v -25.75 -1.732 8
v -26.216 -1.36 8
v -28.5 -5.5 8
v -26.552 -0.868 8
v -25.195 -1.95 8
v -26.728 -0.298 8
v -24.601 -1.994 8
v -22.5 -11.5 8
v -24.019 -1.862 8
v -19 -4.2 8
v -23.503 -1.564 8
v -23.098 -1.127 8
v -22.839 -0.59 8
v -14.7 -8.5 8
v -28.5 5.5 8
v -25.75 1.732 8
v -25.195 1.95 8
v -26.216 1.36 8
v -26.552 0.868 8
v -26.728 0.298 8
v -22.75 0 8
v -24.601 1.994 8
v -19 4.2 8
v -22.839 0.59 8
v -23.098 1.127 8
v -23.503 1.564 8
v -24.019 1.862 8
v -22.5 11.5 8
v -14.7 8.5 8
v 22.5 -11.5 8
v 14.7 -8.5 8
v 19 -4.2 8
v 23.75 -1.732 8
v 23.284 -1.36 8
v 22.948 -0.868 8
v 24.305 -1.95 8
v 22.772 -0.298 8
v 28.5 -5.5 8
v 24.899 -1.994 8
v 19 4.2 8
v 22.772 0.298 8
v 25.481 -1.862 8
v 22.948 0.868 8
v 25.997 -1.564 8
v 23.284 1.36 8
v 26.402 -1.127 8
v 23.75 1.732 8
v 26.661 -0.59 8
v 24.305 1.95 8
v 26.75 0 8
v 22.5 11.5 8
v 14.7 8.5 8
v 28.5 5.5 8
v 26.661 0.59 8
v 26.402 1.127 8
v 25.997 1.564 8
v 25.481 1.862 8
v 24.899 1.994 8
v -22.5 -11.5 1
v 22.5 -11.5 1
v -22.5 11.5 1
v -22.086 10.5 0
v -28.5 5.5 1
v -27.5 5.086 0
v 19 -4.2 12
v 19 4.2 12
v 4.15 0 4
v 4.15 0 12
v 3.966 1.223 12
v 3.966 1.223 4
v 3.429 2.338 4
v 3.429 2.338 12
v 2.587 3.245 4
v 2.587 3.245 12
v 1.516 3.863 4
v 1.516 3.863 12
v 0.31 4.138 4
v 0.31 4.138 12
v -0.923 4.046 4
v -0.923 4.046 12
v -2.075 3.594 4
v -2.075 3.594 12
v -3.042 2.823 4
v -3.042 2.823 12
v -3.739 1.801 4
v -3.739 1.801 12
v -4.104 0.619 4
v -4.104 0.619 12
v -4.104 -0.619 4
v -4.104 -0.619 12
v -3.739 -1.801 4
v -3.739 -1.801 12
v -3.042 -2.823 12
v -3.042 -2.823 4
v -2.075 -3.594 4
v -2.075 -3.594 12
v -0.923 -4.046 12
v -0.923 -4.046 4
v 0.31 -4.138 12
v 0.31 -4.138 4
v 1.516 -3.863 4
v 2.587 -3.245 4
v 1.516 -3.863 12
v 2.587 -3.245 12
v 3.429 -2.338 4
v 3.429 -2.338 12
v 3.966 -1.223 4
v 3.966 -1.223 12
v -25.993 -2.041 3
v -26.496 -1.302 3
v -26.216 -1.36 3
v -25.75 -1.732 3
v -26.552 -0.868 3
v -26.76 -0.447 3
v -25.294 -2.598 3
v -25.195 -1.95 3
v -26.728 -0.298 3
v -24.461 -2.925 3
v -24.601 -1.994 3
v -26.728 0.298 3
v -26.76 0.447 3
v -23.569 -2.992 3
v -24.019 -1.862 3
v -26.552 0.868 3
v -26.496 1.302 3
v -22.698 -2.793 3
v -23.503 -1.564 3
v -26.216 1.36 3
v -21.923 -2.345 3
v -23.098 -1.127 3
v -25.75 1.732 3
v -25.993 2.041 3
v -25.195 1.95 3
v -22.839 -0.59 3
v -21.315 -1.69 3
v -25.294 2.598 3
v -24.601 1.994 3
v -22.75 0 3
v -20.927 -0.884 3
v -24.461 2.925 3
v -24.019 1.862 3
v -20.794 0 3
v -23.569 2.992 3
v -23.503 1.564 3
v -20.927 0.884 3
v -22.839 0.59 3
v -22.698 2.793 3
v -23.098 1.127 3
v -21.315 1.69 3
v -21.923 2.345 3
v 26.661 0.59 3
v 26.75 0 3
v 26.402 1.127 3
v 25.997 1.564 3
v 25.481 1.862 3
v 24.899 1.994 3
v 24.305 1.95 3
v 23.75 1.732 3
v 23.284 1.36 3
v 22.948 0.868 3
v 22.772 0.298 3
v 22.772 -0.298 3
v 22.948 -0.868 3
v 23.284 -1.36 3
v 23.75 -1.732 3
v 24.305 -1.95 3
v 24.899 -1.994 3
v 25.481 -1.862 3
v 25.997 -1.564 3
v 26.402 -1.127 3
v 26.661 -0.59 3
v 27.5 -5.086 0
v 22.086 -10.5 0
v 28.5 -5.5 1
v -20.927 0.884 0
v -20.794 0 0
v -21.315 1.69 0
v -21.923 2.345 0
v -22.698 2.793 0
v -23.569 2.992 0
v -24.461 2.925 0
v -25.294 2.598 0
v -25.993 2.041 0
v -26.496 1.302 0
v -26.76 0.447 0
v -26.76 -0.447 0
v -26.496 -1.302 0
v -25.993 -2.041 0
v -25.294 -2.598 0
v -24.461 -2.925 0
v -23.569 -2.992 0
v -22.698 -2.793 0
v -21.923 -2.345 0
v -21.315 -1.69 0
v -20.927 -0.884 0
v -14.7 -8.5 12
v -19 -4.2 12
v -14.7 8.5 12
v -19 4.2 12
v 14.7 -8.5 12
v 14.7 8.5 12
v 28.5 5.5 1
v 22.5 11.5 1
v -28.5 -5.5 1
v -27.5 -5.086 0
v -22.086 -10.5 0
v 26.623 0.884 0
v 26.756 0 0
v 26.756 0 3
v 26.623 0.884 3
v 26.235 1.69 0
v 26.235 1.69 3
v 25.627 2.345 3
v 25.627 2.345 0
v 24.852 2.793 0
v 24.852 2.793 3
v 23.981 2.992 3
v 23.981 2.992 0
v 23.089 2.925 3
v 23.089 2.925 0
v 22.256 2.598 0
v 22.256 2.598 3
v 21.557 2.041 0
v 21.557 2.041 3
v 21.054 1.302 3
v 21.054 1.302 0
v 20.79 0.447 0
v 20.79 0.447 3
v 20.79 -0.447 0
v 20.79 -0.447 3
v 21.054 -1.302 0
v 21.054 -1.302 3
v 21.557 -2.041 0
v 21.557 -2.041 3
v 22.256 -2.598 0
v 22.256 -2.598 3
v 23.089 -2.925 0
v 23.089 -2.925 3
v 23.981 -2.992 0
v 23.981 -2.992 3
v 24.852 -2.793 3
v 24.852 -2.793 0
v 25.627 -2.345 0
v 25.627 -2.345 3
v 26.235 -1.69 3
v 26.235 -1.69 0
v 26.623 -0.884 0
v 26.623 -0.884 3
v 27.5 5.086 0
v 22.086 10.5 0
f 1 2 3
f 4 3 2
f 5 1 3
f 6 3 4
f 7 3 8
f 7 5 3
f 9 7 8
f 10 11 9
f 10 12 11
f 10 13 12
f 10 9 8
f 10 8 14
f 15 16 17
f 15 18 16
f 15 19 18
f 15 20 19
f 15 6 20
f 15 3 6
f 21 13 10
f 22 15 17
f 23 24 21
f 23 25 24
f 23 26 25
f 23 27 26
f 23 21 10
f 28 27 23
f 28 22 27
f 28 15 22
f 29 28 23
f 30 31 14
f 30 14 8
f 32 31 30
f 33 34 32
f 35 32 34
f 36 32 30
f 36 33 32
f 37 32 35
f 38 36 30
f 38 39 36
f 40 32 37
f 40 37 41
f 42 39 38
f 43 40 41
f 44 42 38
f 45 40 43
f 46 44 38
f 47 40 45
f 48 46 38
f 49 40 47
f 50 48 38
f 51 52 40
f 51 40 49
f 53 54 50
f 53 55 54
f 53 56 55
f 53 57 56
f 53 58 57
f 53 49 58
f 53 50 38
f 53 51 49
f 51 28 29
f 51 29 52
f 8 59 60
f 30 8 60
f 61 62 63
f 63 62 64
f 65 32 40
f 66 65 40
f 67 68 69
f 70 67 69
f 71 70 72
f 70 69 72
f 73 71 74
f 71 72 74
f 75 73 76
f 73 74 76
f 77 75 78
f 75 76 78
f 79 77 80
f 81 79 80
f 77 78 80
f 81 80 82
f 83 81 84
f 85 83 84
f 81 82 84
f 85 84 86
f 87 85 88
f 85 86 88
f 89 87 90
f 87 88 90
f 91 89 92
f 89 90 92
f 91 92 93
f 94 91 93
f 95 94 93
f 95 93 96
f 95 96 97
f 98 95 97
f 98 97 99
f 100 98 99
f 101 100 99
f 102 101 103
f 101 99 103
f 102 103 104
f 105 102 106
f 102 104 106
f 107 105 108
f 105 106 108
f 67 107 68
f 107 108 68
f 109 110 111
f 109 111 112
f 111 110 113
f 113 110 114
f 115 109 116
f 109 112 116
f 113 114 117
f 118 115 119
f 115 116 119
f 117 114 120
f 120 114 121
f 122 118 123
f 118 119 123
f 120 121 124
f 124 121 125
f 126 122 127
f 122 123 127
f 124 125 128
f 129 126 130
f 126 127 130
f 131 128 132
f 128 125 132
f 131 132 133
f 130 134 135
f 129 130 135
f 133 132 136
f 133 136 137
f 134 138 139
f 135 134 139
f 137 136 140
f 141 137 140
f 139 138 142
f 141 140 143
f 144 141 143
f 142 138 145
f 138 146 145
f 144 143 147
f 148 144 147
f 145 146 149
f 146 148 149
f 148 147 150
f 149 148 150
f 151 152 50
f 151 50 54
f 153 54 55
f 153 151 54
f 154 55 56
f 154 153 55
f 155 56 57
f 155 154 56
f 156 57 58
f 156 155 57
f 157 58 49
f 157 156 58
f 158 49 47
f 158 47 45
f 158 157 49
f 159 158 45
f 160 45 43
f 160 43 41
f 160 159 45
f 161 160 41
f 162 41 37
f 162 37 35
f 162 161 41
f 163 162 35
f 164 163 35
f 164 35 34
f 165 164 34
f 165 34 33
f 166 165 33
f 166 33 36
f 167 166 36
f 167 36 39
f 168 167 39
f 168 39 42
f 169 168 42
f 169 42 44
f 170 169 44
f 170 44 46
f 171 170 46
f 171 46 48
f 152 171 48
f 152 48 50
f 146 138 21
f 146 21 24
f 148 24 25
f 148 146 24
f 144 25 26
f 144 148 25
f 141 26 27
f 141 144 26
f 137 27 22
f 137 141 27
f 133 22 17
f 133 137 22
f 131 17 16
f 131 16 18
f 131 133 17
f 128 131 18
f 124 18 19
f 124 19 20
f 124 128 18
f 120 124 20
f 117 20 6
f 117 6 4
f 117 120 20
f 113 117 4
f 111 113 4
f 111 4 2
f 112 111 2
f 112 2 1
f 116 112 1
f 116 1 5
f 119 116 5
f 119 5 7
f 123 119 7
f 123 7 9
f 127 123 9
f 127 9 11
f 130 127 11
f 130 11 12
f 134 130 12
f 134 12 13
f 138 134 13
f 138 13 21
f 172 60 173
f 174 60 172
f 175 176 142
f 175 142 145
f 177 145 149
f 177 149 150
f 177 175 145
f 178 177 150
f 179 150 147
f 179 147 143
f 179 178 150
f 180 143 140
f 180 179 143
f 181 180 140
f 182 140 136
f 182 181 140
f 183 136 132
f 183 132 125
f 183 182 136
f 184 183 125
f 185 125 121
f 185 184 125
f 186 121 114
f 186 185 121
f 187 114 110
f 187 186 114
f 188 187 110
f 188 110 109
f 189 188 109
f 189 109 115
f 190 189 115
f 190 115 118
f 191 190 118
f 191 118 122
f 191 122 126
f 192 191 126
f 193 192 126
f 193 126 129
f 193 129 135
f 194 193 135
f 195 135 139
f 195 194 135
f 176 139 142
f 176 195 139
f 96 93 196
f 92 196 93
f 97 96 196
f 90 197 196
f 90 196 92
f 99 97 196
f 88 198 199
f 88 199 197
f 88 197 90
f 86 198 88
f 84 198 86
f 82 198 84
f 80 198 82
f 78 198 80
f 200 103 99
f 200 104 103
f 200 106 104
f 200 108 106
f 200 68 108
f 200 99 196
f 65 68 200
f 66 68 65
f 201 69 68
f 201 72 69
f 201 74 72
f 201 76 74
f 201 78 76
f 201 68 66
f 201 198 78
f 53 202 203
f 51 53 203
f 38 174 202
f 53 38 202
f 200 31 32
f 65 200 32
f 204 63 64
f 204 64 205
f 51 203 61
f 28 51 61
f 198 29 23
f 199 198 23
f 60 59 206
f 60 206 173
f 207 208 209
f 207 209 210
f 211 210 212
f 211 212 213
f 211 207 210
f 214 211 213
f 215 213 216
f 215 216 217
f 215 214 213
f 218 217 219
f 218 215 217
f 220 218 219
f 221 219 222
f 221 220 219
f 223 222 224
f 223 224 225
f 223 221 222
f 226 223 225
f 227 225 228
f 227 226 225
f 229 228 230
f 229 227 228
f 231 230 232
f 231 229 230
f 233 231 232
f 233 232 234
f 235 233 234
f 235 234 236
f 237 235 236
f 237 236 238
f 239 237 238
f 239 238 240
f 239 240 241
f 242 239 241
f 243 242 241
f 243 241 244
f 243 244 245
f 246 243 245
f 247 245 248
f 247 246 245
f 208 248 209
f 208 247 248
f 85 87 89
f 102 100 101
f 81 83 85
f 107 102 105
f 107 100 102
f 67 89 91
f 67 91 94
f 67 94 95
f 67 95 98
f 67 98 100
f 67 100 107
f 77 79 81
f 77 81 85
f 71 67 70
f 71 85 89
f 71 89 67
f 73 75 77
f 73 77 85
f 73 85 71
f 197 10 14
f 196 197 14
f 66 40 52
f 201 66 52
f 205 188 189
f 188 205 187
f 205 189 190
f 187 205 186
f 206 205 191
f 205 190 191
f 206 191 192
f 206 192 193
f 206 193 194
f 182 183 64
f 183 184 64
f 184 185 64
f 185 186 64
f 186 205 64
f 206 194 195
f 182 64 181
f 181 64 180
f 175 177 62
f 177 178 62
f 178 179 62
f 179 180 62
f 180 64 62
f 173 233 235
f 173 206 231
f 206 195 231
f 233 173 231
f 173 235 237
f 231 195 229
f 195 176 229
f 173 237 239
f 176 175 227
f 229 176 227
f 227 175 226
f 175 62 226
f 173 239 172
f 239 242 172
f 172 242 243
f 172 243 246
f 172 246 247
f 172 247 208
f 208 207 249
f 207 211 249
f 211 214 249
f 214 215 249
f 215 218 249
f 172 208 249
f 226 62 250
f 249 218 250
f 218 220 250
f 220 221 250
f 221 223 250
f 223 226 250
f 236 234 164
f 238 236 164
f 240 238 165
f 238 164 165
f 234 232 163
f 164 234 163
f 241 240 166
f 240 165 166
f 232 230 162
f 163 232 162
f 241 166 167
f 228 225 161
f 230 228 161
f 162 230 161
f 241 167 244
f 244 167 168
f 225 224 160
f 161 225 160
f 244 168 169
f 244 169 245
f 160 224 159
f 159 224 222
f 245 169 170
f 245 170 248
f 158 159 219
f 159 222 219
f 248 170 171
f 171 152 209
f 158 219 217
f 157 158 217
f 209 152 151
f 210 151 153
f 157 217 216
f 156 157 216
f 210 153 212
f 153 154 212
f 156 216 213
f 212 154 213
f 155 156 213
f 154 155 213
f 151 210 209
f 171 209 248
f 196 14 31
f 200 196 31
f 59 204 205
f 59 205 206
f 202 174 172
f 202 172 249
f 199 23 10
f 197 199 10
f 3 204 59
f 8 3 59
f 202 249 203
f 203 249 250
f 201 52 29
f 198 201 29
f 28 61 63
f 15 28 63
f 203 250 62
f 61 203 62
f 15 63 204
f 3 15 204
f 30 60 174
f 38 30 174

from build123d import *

# Parameters (mm, degrees)
F1_DEPTH = 12
F0_R     = 2
F2_DEPTH = 8
F3_SIZE  = 1
F4_R     = 4.15
F5_DEPTH = 8
F6_R     = 3
F7_DEPTH = 3


with BuildPart() as f1:
    # F0 (on Top) → F1 (new body)
    with BuildSketch(Plane.XY):
        Polygon((14.7, 8.5), (-14.7, 8.5), (-19, 4.2), (-19, -4.2), (-14.7, -8.5), (14.7, -8.5), (19, -4.2), (19, 4.2), align=None)
    extrude(amount=F1_DEPTH)

    # F0 (on Top) → F2 (join)
    with BuildSketch(Plane.XY):
        Polygon((22.5, 11.5), (-22.5, 11.5), (-28.5, 5.5), (-28.5, -5.5), (-22.5, -11.5), (22.5, -11.5), (28.5, -5.5), (28.5, 5.5), align=None)
        with Locations((-24.75, 0)):
            Circle(F0_R, mode=Mode.SUBTRACT)
        Polygon((-19, 4.2), (-14.7, 8.5), (14.7, 8.5), (19, 4.2), (19, -4.2), (14.7, -8.5), (-14.7, -8.5), (-19, -4.2), align=None, mode=Mode.SUBTRACT)
        with Locations((24.75, 0)):
            Circle(F0_R, mode=Mode.SUBTRACT)
    extrude(amount=F2_DEPTH)

    # F3
    f3_edges = [f1.edges().sort_by_distance(p)[0] for p in [
        (0, -11.5, 0),
        (-25.5, -8.5, 0),
        (-28.5, 0, 0),
        (-25.5, 8.5, 0),
        (0, 11.5, 0),
        (25.5, 8.5, 0),
        (28.5, 0, 0),
        (25.5, -8.5, 0),
    ]]
    chamfer(f3_edges, length=F3_SIZE)

    # F4 (on face) → F5 (cut)
    with BuildSketch(Plane.XY.offset(12)):
        Circle(F4_R)
    extrude(amount=-F5_DEPTH, mode=Mode.SUBTRACT)

    # F6 (on Top) → F7 (cut)
    with BuildSketch(Plane.XY):
        with Locations((-23.793586, 0)):
            Circle(F6_R)
        with Locations((23.756452, 0)):
            Circle(F6_R)
    extrude(amount=F7_DEPTH, mode=Mode.SUBTRACT)


solid = f1.part
